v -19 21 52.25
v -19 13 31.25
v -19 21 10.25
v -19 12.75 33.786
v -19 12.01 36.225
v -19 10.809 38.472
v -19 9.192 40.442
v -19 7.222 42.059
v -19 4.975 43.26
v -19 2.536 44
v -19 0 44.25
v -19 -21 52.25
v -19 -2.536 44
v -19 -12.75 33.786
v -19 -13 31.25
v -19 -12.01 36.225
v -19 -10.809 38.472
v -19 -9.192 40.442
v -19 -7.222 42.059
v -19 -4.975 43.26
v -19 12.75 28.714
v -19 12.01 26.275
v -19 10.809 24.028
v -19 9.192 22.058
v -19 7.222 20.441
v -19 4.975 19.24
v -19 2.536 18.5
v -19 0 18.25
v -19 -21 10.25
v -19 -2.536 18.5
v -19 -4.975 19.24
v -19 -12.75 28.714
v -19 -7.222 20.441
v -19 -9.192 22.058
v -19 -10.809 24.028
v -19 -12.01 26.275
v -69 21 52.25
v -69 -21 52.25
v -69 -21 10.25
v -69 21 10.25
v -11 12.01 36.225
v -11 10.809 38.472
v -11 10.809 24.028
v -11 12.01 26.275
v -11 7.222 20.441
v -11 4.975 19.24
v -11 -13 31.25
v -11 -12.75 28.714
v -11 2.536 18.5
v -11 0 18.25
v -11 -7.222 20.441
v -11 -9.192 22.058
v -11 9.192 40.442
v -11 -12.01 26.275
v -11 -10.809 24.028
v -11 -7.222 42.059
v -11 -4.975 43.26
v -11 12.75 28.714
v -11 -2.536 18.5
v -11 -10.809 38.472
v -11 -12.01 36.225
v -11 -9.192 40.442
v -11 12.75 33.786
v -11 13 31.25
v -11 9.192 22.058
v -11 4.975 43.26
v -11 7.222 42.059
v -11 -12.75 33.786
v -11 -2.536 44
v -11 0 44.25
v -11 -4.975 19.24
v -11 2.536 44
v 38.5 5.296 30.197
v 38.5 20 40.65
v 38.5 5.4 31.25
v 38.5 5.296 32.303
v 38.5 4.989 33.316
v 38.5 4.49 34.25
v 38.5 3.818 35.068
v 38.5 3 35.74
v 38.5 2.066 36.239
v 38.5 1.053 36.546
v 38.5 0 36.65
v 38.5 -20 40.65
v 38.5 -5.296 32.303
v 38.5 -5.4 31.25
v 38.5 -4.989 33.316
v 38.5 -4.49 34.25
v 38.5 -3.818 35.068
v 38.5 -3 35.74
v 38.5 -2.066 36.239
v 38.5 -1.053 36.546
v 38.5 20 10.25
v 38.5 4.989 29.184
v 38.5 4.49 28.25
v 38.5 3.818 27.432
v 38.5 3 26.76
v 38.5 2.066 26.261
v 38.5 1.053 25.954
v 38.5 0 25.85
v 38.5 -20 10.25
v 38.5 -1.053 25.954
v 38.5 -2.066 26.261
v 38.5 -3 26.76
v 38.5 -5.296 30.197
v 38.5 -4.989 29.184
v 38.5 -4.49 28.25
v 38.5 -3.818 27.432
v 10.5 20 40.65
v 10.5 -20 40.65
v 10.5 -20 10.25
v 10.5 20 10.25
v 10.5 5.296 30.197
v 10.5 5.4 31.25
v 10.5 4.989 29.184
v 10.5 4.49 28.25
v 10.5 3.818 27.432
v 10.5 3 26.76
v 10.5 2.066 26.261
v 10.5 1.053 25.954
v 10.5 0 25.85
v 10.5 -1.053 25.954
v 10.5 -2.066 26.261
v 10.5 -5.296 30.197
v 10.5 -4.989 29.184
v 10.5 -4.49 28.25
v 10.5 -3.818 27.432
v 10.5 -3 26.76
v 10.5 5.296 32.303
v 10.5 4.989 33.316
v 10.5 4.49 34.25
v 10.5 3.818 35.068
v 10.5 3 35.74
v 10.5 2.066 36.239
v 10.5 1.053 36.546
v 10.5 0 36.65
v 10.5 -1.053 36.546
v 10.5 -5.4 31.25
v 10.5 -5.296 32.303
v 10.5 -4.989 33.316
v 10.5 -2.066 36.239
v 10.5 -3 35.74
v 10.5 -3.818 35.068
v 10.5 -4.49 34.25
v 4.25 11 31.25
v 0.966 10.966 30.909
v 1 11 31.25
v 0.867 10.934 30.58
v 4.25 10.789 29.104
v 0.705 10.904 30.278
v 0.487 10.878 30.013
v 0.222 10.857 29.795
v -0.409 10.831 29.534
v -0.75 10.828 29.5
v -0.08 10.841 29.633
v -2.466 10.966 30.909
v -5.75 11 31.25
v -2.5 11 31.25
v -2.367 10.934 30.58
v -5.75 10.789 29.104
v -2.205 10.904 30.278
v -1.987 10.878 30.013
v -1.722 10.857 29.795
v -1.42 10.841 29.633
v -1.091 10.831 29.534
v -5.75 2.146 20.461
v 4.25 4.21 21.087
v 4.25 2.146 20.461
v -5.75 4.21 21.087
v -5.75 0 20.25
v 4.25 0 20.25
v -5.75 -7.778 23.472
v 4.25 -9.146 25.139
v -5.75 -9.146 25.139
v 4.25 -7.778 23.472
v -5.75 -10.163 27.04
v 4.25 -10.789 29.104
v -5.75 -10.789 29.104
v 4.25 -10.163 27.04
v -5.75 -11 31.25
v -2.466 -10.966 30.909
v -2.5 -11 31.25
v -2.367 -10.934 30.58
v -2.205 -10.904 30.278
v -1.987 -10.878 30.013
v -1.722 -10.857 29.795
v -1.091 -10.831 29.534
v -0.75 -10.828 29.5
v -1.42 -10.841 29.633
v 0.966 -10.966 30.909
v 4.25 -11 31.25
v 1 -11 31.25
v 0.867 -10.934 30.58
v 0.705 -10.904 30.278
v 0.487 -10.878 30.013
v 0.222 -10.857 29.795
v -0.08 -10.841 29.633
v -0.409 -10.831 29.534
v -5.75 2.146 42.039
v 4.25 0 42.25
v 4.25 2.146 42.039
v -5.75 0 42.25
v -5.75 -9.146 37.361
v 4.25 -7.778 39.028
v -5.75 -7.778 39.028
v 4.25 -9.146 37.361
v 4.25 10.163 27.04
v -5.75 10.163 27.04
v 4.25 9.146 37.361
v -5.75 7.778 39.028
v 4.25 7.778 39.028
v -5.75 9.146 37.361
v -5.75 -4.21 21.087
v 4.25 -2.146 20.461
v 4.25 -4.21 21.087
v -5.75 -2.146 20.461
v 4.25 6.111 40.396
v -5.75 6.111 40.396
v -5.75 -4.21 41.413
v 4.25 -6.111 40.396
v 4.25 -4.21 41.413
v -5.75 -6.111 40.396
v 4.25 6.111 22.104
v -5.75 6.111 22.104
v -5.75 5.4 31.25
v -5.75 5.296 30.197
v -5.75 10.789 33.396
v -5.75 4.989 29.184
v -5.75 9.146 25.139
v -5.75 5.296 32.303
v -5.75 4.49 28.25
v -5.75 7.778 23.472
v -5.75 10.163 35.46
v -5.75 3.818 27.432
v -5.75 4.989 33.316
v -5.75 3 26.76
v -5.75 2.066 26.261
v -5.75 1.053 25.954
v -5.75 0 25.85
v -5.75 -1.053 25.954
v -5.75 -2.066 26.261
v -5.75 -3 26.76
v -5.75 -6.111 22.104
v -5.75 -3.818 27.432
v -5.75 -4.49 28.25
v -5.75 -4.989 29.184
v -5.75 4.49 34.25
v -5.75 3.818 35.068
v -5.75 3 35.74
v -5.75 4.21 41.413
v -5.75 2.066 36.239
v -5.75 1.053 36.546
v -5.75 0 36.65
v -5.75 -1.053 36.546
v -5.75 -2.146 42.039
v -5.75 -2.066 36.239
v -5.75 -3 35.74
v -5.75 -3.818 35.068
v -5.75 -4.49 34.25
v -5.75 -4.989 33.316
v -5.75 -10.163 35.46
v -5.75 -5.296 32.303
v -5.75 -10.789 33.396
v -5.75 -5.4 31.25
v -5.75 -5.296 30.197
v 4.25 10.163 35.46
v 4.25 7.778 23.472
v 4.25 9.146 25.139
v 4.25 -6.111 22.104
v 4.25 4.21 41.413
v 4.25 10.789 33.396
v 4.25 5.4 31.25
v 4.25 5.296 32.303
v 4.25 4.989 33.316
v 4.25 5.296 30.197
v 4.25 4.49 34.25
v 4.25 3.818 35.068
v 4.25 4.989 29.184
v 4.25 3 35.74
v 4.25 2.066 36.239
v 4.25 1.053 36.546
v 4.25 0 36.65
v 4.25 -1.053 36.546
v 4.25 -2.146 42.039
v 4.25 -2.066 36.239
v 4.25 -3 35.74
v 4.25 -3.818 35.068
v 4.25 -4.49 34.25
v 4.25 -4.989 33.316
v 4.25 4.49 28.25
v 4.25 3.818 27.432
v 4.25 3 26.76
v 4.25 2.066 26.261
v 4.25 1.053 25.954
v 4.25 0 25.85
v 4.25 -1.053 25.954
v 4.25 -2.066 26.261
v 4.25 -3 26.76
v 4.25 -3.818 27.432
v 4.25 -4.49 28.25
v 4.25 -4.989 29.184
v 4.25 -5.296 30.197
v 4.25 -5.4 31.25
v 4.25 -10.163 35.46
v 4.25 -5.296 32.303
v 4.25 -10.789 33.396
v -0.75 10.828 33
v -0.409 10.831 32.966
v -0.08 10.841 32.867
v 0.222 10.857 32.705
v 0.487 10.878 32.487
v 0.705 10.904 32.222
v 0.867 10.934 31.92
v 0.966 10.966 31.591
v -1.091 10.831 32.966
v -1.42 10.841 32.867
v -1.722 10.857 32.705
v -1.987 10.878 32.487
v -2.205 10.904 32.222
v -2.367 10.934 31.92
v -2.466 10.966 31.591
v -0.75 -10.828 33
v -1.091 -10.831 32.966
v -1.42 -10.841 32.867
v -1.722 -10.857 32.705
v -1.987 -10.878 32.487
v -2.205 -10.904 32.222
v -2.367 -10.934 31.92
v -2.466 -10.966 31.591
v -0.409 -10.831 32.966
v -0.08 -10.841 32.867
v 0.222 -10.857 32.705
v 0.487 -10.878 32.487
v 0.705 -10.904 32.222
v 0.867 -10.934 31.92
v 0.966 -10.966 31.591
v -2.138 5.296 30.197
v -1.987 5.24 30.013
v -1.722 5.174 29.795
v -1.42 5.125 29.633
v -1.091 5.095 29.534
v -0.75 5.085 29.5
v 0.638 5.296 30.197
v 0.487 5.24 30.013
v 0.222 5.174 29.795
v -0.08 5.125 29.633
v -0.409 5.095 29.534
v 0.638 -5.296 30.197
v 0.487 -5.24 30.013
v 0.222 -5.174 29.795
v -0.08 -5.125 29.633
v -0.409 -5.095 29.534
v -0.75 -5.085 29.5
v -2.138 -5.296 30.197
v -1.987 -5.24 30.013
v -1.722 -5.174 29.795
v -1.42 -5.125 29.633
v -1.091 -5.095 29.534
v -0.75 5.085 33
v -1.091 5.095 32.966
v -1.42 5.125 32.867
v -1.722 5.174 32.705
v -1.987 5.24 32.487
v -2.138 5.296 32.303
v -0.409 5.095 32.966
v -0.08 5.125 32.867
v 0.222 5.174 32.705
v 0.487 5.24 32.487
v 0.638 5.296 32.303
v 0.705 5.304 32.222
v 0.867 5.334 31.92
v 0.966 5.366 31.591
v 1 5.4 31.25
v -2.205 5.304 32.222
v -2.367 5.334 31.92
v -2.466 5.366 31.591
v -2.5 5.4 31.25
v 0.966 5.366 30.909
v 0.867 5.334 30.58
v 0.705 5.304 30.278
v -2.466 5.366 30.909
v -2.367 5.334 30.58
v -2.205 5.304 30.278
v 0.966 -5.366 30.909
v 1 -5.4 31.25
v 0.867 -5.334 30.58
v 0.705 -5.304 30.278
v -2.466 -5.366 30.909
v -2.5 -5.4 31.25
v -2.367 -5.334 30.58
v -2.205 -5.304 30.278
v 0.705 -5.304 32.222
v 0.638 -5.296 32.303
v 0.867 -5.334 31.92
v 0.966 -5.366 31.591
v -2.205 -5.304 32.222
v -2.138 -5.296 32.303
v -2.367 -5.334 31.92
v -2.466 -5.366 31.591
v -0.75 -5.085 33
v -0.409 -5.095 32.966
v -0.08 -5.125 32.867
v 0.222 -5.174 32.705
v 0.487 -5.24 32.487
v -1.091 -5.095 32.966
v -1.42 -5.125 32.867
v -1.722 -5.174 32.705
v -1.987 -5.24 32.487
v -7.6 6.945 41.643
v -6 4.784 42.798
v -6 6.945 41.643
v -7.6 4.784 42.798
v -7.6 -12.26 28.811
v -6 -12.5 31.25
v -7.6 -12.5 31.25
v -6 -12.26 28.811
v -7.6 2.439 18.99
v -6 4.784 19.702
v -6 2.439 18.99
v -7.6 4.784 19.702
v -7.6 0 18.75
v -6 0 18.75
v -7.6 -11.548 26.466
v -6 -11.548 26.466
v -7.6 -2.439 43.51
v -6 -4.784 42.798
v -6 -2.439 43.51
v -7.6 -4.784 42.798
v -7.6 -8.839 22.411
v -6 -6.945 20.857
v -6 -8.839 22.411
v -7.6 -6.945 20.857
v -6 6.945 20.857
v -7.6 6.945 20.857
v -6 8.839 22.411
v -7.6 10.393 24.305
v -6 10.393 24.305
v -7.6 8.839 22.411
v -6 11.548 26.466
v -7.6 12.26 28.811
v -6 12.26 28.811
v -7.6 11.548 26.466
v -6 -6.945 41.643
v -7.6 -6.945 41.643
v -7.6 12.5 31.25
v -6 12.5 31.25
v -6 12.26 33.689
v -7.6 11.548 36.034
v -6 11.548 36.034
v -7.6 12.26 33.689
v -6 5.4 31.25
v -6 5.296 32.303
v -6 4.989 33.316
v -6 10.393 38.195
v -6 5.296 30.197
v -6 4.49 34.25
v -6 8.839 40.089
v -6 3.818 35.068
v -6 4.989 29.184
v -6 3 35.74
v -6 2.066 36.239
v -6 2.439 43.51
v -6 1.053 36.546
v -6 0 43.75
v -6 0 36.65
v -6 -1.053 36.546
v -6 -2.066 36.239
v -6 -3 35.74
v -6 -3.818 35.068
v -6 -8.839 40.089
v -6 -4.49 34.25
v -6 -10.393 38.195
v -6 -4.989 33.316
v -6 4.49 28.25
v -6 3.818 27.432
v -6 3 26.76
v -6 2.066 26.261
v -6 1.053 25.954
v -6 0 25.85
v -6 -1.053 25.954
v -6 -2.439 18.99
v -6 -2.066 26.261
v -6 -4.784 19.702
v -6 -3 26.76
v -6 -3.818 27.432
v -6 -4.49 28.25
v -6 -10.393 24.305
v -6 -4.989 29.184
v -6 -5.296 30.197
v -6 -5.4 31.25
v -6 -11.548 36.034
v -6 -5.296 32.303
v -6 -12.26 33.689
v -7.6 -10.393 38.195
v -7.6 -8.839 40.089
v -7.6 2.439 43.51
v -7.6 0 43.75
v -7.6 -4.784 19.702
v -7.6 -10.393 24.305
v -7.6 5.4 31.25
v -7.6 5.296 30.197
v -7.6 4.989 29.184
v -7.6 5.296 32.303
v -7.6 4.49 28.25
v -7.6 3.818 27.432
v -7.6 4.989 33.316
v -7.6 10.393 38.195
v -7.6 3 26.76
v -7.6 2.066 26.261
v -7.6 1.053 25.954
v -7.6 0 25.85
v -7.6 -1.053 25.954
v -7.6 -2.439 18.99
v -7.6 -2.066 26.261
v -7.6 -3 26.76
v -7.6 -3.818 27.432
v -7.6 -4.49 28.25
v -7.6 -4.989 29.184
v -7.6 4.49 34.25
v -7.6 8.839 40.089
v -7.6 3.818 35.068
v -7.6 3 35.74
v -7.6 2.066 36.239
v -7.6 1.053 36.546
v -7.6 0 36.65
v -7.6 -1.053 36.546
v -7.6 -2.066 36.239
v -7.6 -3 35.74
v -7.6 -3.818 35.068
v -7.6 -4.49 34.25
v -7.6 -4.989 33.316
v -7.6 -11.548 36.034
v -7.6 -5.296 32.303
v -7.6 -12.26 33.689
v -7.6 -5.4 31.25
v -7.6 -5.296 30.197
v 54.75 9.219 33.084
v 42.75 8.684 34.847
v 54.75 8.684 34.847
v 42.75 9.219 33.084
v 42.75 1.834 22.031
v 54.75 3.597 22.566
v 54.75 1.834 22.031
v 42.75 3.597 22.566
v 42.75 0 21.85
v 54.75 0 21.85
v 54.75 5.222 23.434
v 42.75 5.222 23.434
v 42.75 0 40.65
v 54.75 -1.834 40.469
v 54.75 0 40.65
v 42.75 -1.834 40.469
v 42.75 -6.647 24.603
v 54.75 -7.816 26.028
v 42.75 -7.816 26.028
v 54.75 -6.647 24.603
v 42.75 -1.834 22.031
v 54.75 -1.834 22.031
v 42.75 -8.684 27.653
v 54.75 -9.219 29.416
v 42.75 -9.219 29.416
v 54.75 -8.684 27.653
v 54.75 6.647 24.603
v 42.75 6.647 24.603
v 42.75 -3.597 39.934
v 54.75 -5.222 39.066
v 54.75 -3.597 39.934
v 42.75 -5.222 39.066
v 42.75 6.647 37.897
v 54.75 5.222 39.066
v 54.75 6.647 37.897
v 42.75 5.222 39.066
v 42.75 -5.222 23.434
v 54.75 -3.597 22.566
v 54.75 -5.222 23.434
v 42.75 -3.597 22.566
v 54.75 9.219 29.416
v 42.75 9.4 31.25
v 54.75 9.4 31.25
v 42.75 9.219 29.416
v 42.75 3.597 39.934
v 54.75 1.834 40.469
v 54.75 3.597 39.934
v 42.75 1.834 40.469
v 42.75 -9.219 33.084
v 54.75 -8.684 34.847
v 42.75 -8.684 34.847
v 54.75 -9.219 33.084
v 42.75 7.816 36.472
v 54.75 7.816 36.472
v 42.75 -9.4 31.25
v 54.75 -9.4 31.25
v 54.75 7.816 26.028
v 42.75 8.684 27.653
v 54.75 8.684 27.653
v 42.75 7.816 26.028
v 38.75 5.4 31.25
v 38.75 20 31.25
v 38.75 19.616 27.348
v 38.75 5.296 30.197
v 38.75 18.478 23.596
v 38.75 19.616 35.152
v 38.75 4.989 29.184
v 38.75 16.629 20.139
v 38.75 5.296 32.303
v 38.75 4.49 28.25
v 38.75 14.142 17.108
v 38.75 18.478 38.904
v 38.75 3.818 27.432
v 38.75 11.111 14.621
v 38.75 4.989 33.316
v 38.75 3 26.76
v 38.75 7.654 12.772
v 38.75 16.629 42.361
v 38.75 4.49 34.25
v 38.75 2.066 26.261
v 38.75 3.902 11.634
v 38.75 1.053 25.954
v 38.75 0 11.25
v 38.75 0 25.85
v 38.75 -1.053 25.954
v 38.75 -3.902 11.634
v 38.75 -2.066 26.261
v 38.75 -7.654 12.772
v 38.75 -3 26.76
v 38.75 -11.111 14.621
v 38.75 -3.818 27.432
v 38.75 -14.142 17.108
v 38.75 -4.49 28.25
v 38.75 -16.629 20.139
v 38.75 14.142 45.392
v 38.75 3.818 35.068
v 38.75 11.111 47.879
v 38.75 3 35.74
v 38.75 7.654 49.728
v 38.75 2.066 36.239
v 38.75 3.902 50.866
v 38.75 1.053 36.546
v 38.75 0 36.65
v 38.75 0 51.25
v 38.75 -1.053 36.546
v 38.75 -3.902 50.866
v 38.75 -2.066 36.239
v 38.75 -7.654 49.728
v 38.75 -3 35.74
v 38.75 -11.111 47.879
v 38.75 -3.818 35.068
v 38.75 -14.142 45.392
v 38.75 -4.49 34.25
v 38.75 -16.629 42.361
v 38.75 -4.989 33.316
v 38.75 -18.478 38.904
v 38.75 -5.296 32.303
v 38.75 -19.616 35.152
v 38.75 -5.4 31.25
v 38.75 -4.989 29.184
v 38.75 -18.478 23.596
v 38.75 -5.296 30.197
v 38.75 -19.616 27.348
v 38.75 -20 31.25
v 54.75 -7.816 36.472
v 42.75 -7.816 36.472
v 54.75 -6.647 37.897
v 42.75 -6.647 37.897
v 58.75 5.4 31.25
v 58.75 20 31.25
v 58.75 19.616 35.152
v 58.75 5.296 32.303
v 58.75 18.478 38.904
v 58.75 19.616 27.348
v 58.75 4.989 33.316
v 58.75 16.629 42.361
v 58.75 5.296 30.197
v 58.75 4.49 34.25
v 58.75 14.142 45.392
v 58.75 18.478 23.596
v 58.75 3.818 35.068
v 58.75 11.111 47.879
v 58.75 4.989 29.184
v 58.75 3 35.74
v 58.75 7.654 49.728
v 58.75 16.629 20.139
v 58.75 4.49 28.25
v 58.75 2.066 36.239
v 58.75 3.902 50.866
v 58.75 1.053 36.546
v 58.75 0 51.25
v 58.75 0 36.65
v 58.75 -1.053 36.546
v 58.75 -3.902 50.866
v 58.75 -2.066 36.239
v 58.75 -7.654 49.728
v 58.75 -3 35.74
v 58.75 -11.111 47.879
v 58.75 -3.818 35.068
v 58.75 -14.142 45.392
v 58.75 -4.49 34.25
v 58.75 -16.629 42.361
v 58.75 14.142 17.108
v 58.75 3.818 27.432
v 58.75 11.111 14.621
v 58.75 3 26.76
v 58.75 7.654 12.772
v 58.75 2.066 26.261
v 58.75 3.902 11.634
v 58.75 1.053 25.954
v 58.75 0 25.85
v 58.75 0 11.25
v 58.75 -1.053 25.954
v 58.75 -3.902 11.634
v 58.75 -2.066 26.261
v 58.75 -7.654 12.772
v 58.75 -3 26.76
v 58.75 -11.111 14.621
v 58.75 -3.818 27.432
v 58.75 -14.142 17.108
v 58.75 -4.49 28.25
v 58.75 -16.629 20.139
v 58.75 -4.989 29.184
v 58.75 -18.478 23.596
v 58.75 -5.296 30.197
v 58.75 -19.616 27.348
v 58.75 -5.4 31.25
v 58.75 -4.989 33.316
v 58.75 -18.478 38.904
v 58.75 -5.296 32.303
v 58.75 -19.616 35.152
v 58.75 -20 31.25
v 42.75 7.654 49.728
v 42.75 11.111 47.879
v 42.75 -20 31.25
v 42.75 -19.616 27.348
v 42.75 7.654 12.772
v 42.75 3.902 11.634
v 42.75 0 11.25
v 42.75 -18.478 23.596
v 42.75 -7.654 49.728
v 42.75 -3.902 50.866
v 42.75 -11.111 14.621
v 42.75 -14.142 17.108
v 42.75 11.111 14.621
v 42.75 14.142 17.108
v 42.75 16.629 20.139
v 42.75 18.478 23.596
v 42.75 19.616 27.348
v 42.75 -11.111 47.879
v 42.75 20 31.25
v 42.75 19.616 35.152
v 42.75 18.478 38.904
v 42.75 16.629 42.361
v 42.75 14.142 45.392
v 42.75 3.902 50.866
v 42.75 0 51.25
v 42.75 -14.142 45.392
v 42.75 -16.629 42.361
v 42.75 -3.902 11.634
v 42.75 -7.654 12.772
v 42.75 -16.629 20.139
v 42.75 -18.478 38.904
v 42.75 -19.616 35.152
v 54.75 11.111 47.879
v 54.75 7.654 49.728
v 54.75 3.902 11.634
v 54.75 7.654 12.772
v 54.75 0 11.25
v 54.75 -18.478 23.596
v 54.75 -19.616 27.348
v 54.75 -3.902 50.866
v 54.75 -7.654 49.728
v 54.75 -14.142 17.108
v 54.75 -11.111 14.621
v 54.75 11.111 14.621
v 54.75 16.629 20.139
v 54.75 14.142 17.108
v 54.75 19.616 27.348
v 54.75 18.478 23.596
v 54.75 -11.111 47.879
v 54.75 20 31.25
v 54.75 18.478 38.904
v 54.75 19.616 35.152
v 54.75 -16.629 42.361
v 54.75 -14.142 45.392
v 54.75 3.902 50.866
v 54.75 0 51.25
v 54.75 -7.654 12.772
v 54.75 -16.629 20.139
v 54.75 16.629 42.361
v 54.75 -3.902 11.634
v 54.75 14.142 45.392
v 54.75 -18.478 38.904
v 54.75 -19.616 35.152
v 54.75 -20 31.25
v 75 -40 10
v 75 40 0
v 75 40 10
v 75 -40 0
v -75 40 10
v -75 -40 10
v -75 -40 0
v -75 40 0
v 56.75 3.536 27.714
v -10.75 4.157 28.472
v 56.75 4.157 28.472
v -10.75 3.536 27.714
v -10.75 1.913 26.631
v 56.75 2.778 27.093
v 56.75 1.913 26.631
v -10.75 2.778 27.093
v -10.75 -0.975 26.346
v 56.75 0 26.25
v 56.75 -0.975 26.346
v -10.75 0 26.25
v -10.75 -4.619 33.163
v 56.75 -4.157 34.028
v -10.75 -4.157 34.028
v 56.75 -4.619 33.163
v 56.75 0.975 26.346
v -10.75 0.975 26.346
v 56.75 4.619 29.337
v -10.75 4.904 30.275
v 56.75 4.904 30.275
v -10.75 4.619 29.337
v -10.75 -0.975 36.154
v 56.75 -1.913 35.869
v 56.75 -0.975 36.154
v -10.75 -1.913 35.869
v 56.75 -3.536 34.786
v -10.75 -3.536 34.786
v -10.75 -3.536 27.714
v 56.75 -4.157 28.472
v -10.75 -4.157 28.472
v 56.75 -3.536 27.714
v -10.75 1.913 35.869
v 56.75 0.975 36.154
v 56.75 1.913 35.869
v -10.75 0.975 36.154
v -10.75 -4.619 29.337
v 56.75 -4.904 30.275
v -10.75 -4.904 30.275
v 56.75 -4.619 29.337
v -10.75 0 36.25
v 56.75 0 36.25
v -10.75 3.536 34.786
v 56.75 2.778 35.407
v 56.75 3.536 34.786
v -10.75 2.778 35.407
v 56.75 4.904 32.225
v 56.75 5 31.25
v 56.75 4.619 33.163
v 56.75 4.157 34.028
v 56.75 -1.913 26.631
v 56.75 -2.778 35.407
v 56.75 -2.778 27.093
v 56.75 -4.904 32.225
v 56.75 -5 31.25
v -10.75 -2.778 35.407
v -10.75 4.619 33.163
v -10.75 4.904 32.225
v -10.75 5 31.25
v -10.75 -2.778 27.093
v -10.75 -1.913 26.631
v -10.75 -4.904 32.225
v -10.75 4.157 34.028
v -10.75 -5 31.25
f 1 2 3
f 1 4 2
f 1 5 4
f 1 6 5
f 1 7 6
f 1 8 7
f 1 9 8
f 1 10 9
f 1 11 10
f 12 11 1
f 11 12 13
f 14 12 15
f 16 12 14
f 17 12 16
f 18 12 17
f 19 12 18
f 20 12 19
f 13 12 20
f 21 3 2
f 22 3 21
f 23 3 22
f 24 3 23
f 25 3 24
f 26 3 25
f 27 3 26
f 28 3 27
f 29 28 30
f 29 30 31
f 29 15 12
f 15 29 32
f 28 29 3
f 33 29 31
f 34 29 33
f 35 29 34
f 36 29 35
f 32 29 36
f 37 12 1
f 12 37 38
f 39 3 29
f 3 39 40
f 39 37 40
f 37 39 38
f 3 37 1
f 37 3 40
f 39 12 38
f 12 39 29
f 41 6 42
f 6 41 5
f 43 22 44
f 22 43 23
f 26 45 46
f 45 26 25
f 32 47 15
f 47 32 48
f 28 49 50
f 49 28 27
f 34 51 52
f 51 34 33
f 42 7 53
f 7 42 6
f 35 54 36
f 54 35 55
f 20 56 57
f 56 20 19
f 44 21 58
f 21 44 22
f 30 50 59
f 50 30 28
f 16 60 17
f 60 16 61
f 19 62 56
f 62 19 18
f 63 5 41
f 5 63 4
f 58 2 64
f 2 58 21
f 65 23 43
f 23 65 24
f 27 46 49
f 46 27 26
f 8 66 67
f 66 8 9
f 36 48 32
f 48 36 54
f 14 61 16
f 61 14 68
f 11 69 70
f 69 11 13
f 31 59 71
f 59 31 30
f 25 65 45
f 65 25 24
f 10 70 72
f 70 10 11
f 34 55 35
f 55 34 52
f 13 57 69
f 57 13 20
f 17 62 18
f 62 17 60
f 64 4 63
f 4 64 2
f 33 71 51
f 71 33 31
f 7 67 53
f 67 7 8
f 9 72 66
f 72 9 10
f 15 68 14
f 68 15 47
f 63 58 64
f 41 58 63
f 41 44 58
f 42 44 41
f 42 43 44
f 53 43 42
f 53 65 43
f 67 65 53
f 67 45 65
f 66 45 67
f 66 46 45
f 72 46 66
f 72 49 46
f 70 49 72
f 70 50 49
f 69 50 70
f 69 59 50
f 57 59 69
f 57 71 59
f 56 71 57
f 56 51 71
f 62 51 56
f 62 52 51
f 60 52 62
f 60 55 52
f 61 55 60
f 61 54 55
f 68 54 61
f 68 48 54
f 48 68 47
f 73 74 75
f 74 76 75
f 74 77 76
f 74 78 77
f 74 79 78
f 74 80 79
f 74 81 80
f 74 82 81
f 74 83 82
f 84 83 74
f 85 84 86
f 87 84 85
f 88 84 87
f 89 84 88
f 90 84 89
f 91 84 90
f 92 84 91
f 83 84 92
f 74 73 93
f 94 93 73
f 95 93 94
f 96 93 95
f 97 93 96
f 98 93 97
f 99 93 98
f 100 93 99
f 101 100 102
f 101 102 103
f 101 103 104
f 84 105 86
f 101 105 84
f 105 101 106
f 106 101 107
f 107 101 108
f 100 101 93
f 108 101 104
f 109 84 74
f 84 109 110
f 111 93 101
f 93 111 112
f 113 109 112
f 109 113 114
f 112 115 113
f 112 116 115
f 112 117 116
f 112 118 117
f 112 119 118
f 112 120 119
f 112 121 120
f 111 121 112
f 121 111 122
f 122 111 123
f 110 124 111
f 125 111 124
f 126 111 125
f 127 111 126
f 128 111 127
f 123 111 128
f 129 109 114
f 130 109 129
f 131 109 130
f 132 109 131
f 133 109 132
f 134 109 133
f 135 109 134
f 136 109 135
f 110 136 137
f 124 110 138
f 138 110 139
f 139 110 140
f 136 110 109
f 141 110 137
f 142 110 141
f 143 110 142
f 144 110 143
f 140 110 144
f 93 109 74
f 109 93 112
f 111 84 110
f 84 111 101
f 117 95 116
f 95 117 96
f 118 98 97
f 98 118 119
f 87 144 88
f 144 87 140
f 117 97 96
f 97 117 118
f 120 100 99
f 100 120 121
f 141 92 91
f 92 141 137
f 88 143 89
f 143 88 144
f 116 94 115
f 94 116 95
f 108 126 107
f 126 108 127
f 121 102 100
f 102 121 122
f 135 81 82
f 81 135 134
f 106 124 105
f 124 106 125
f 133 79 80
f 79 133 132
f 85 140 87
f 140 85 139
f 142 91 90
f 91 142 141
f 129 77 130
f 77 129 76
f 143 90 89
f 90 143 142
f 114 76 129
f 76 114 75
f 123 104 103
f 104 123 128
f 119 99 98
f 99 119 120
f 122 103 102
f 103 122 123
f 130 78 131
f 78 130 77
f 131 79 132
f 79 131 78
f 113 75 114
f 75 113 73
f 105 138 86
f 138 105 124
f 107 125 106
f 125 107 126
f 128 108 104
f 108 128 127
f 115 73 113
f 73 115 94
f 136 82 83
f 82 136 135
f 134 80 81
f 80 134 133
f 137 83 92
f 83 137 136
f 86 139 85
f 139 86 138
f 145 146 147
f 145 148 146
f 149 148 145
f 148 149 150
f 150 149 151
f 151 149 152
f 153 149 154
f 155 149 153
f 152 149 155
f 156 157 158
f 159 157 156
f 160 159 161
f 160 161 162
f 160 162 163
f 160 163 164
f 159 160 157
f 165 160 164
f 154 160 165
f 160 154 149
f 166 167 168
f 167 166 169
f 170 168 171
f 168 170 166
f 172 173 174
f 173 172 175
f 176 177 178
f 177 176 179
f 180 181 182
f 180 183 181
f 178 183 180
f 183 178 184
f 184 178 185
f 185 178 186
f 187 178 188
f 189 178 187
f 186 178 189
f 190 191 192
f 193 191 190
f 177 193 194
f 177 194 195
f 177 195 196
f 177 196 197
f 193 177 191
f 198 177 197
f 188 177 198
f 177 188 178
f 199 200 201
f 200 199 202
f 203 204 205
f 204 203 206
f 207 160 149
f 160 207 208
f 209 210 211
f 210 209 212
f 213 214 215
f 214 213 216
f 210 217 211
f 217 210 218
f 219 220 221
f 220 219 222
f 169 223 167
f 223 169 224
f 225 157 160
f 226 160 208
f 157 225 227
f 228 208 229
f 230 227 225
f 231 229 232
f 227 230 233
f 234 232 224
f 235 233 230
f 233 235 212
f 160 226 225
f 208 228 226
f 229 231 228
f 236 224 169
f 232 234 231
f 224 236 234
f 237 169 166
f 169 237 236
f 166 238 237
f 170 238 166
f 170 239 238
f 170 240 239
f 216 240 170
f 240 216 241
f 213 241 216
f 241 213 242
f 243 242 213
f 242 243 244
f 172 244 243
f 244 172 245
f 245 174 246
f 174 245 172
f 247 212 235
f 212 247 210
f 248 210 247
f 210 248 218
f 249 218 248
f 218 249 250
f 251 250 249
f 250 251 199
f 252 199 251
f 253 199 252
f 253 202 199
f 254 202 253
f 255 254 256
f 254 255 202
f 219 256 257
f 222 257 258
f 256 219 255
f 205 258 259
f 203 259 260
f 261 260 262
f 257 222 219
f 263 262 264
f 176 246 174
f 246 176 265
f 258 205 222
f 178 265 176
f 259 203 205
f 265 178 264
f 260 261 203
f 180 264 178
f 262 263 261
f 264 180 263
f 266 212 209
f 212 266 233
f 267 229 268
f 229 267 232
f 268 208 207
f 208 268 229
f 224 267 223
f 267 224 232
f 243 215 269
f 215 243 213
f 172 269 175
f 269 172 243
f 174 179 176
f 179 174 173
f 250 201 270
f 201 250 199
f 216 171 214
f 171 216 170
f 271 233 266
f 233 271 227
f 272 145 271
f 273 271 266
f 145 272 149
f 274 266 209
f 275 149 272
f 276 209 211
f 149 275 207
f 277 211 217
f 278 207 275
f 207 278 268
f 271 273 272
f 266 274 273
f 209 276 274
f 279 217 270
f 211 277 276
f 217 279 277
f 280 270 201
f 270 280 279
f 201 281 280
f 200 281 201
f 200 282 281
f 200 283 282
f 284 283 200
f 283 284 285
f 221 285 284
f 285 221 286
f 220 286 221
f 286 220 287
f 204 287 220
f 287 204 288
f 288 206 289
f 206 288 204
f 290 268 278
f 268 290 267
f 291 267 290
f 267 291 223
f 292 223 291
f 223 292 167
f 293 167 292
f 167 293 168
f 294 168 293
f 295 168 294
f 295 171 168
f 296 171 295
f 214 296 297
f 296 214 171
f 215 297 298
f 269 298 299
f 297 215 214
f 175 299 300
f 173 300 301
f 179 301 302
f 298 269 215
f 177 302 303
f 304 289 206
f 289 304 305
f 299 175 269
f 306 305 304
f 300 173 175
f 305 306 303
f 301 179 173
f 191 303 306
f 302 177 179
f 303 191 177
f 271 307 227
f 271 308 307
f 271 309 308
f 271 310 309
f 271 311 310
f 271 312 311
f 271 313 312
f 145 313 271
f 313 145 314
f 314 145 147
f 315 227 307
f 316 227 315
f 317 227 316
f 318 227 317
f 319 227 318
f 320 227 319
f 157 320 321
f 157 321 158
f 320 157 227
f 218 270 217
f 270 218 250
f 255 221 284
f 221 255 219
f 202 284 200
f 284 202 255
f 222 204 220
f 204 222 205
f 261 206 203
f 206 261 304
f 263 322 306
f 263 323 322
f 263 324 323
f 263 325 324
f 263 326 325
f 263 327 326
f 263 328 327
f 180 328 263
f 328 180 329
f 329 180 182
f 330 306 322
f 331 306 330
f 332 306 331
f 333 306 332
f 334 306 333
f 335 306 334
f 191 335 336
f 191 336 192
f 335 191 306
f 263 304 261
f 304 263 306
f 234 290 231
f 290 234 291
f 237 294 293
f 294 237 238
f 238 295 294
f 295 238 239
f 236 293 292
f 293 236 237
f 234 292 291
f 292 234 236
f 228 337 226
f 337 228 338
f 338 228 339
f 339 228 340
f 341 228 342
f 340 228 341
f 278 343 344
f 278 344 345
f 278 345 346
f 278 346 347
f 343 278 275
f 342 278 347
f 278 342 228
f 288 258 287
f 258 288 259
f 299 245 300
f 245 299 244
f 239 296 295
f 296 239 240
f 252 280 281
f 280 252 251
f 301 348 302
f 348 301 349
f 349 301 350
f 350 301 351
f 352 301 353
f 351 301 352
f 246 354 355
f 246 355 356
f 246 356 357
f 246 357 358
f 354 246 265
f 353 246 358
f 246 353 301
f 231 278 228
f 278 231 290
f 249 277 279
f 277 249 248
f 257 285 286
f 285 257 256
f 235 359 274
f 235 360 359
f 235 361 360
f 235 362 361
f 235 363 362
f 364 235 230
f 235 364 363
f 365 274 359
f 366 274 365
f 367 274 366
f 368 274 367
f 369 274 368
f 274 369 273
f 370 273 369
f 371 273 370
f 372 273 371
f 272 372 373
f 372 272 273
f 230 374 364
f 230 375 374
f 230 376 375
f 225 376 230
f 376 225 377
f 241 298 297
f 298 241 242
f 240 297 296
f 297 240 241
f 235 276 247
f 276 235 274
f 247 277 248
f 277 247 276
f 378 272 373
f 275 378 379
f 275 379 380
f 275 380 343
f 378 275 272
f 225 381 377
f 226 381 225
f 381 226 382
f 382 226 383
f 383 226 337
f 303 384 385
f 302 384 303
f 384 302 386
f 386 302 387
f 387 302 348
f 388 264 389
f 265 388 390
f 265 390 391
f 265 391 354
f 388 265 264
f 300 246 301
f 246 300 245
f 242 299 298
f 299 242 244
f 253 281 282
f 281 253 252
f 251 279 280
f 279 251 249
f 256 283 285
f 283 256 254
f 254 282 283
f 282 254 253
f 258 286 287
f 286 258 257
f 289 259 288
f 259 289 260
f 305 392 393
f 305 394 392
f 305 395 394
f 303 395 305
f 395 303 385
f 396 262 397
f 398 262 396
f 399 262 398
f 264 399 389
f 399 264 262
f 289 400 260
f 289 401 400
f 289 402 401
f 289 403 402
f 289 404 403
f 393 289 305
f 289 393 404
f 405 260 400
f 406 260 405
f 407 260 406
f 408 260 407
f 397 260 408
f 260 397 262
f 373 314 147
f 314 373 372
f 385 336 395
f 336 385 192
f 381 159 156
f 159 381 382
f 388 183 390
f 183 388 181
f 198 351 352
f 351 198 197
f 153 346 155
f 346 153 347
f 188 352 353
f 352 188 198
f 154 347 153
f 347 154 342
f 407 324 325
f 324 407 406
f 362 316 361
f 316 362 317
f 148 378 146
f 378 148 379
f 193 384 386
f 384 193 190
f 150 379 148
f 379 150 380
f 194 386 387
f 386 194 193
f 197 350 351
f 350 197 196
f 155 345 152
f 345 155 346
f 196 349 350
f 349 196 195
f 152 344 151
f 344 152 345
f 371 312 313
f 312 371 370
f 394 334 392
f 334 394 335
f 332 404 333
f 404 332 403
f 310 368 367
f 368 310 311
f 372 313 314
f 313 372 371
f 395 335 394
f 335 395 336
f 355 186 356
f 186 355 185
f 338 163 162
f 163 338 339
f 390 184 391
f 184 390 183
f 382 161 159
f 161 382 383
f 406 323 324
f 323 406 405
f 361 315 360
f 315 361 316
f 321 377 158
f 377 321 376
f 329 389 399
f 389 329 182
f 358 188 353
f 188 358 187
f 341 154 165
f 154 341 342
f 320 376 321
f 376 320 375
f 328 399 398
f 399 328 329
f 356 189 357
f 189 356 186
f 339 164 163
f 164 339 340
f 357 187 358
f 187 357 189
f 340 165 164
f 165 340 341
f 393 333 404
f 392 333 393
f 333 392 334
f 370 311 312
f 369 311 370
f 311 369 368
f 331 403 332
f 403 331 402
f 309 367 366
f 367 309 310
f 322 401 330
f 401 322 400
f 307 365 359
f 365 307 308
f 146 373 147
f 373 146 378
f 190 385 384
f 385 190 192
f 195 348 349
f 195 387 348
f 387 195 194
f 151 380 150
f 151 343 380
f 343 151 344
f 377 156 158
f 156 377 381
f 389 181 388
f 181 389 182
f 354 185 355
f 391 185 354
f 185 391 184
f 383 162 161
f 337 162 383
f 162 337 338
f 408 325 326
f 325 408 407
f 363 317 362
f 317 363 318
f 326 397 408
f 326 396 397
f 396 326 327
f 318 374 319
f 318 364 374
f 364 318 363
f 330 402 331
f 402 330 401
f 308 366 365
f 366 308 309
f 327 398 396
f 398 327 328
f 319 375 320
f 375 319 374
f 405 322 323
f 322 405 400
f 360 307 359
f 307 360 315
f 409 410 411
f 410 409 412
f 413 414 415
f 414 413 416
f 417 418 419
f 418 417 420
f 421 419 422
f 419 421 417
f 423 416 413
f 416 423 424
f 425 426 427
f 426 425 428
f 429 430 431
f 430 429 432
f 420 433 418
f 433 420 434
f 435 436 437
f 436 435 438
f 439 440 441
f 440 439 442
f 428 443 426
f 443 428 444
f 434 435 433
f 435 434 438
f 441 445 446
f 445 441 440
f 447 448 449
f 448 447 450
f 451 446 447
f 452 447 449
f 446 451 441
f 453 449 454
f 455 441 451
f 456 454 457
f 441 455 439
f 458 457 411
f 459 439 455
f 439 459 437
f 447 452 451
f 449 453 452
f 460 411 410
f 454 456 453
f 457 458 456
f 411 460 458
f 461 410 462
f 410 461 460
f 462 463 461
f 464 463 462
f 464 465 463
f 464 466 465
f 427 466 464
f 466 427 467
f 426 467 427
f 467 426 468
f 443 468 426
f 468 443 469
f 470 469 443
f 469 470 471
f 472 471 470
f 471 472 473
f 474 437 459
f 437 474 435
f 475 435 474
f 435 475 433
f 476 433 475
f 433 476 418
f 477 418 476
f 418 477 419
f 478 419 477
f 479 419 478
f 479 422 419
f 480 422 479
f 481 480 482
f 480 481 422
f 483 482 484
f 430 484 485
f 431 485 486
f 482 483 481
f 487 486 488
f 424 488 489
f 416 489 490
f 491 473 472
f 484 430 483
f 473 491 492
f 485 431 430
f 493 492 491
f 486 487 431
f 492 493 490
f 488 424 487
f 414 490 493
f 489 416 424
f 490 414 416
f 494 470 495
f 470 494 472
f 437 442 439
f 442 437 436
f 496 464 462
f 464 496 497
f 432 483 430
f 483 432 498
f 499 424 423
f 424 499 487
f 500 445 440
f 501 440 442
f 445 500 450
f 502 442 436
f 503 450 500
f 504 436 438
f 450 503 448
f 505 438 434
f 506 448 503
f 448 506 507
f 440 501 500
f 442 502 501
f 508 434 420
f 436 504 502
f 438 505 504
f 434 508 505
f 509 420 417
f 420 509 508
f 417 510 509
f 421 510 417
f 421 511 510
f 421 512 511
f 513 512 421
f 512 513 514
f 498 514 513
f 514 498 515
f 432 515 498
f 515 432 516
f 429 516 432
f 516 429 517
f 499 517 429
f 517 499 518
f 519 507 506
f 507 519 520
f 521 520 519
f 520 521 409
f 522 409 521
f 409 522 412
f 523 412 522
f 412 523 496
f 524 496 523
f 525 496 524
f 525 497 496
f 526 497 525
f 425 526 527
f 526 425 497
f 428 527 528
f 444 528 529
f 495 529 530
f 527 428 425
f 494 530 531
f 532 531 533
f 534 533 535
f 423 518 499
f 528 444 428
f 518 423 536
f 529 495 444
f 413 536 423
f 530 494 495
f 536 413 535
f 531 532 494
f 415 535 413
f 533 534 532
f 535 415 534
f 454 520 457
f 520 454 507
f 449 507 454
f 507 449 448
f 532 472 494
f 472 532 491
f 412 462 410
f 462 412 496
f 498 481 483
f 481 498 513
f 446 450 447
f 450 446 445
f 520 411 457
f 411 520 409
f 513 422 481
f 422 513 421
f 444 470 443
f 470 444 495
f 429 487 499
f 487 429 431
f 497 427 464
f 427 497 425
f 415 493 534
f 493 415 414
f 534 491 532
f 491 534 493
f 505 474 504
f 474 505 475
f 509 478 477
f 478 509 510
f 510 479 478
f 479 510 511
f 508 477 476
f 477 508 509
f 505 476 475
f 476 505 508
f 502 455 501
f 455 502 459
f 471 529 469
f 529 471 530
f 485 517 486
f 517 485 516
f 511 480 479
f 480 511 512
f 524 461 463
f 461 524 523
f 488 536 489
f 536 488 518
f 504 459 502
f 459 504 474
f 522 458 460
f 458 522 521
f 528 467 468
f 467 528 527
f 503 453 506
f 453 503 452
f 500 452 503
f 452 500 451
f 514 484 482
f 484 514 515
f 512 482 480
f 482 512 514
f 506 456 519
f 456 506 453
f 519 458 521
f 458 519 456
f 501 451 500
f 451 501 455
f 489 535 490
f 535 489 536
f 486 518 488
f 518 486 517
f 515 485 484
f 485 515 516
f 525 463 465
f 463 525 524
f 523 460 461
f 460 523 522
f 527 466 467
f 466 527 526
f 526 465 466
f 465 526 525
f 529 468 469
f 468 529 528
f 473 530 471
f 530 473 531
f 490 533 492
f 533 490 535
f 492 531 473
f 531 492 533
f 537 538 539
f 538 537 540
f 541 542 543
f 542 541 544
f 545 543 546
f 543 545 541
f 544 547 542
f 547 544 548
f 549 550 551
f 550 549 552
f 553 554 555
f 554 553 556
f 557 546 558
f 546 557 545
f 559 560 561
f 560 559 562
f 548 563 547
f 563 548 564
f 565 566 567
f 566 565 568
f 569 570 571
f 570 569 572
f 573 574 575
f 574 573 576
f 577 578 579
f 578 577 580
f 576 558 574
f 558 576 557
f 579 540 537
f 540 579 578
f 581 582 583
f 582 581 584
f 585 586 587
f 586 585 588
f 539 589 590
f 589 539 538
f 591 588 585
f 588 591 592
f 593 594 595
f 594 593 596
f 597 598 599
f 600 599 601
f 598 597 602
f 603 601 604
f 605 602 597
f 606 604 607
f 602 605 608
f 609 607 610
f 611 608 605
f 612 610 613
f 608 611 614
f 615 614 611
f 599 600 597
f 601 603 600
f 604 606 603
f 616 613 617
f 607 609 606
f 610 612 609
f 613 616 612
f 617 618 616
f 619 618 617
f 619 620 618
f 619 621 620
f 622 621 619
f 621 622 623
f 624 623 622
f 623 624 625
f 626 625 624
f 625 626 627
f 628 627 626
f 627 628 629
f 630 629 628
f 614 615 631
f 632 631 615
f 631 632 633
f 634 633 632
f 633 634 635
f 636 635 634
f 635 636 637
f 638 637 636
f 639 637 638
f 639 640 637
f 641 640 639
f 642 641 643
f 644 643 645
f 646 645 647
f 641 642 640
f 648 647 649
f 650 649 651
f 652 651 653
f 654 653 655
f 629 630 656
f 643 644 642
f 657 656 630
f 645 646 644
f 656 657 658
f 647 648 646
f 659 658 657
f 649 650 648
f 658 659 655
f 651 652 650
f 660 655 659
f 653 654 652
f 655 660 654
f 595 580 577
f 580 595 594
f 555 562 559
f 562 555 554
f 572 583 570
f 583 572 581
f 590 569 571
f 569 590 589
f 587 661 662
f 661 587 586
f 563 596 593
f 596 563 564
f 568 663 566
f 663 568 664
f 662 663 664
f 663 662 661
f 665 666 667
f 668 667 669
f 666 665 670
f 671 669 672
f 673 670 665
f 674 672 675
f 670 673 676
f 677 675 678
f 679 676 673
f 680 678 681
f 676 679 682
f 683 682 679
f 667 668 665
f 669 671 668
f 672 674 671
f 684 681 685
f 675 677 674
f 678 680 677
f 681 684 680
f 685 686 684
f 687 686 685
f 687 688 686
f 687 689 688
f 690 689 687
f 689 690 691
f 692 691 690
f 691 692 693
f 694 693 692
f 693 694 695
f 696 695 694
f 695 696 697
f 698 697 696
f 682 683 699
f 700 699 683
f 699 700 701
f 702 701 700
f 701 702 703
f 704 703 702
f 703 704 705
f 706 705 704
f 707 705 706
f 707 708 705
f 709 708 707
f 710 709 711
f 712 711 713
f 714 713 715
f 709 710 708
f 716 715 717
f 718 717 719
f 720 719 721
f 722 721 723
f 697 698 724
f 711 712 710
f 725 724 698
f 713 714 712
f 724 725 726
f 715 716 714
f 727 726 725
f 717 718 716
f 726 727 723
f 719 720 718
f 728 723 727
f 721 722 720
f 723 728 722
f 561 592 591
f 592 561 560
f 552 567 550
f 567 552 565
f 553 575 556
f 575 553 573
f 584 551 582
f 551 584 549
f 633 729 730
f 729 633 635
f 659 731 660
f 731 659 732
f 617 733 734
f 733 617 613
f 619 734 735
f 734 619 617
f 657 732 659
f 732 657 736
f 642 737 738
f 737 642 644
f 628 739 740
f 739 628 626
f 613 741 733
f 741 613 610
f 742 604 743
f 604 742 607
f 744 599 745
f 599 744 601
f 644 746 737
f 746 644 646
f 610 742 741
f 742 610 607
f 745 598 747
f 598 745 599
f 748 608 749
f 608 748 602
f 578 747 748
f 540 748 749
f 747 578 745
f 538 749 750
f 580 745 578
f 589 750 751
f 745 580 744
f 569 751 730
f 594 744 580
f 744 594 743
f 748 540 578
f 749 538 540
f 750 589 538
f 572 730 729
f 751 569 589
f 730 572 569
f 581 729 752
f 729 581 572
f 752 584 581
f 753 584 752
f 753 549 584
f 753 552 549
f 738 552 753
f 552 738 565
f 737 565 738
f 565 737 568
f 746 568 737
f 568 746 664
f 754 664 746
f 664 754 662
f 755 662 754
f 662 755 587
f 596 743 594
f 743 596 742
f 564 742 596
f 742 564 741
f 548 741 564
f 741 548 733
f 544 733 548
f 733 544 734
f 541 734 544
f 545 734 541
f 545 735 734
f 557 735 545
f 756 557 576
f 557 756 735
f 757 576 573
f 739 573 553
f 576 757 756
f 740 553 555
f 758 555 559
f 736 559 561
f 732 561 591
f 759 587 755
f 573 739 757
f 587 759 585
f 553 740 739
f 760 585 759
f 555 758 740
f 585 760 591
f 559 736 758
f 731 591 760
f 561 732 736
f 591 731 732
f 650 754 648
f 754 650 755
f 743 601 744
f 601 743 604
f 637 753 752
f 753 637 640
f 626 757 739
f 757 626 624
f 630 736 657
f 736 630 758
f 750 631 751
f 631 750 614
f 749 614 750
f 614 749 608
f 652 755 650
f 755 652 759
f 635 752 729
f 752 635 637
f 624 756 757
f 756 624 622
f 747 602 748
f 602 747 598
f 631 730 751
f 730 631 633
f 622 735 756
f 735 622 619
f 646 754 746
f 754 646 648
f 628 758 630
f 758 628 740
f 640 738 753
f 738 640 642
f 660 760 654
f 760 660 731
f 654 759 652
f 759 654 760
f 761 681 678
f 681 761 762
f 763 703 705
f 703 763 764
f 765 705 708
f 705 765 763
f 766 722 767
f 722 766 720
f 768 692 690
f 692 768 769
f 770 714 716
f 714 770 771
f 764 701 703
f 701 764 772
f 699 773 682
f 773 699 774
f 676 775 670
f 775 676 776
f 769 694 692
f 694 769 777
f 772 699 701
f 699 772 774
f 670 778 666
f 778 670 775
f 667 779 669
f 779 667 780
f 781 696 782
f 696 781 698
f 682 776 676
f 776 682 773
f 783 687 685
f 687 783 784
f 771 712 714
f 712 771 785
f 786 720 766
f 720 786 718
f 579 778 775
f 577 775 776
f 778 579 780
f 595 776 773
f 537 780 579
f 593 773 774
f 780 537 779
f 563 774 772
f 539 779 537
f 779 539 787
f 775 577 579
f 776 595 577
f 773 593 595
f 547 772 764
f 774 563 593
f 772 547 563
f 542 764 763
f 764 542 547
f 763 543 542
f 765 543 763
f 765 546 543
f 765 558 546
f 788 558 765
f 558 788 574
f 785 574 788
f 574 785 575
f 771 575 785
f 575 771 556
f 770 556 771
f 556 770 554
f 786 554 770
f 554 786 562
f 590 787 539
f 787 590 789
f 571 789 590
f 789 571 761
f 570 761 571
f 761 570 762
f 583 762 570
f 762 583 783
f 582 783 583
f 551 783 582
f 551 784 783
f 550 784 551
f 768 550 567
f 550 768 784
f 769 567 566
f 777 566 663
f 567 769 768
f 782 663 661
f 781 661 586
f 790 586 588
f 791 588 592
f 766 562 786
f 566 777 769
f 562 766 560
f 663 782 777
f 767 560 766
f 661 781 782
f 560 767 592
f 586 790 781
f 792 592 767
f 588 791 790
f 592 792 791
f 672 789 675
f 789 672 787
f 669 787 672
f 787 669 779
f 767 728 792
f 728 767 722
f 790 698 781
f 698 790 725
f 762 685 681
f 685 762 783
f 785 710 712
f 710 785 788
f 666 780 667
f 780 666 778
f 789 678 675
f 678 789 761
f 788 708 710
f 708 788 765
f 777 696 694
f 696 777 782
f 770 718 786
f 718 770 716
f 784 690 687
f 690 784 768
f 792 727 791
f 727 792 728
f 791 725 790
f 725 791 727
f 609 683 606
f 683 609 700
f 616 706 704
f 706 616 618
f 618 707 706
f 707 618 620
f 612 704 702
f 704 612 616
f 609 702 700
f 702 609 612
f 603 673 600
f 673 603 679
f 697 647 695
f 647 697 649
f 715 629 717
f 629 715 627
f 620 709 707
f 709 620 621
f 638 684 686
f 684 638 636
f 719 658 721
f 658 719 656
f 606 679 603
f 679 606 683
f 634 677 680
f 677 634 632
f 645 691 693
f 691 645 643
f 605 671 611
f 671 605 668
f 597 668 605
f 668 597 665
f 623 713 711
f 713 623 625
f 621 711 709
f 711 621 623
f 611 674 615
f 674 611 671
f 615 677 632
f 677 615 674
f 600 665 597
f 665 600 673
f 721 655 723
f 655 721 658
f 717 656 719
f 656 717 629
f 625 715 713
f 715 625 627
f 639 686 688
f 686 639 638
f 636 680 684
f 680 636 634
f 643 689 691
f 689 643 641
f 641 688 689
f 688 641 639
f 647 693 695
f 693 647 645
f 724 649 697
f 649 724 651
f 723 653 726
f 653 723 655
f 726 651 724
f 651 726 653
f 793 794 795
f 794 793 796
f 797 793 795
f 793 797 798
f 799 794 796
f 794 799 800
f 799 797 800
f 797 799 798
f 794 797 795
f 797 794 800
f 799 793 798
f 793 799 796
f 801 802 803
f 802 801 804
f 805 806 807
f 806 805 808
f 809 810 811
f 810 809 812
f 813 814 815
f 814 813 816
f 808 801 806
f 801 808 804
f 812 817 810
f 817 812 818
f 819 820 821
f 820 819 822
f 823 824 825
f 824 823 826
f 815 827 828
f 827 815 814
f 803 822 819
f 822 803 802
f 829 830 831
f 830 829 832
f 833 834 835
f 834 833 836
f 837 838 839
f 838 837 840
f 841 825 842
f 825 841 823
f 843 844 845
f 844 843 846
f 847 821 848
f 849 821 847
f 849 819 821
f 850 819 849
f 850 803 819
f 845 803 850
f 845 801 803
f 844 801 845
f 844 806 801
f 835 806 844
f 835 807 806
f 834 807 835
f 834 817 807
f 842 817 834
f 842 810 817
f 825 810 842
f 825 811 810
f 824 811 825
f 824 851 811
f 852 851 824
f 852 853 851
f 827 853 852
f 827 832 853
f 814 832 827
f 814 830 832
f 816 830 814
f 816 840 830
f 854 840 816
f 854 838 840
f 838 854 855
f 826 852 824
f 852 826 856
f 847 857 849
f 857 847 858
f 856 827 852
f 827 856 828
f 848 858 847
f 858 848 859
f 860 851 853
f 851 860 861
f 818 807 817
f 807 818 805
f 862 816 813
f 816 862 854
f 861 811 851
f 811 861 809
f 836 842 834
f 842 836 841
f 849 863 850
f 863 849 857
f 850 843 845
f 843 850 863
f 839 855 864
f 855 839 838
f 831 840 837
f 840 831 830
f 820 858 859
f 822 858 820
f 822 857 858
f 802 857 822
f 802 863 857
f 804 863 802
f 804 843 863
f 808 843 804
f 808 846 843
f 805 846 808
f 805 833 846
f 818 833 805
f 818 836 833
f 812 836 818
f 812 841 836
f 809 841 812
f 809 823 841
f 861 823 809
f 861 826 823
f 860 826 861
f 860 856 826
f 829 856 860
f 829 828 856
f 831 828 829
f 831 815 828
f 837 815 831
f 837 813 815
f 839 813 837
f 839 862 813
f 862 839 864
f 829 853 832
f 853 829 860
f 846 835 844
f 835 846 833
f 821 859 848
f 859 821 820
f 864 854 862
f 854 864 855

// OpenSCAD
$fn = 32;

// ------------------------------------------------------------------------
// Motor drive station: motor 50 x 42 mm, shaft d10, pulley d40
// Every part is its own module, assembly() places every instance.
// ------------------------------------------------------------------------

// --- part 1 ---
module station_bed() {
  difference() {
    translate([-75, -40, 0]) cube([150, 80, 10]);
  }
}

// --- part 2 ---
module drive_motor() {
  union() {
    translate([-25, -21, 0]) cube([50, 42, 42]);
    translate([29, 0, 21]) rotate([0, 90, 0]) cylinder(h = 8, d = 26, center = true);
  }
}

// --- part 3 ---
module pillow_block() {
  difference() {
    translate([-14, -20, 0]) cube([28, 40, 30.4]);
    translate([0, 0, 21]) rotate([0, 90, 0]) cylinder(h = 30, d = 10.8, center = true);
  }
}

// --- part 4 ---
module drive_shaft() {
  translate([0, 0, -33.75]) cylinder(h = 67.5, d = 10);
}

// --- part 5 ---
module shaft_collar() {
  difference() {
    cylinder(h = 10, d = 22);
    translate([0, 0, -1]) cylinder(h = 12, d = 10.8);
    translate([0, 0, 5]) rotate([90, 0, 0]) cylinder(h = 24, d = 3.5, center = true);
  }
}

// --- part 6 ---
module collar_washer() {
  difference() {
      translate([0, 0, 0]) cylinder(h = 1.6, d = 25);
      translate([0, 0, -1]) cylinder(h = 3.6, d = 10.8);
    }
}

// --- part 7 ---
module drive_pulley() {
  difference() {
    union() {
      cylinder(h = 20, d = 18.8);
      cylinder(h = 4, d = 40);
      translate([0, 0, 16]) cylinder(h = 4, d = 40);
    }
    translate([0, 0, -1]) cylinder(h = 22, d = 10.8);
  }
}

// --- assembly ---
module assembly() {
  color([0.80, 0.24, 0.20]) translate([0, 0, 0]) rotate([0, 0, 0]) station_bed();
  color([0.20, 0.45, 0.75]) translate([-44, 0, 10.25]) rotate([0, 0, 0]) drive_motor();
  color([0.25, 0.62, 0.32]) translate([24.5, 0, 10.25]) rotate([0, 0, 0]) pillow_block();
  color([0.92, 0.70, 0.18]) translate([23, 0, 31.25]) rotate([0, 90, 0]) drive_shaft();
  color([0.58, 0.35, 0.70]) translate([-5.75, 0, 31.25]) rotate([0, 90, 0]) shaft_collar();
  color([0.16, 0.66, 0.66]) translate([-7.6, 0, 31.25]) rotate([0, 90, 0]) collar_washer();
  color([0.85, 0.48, 0.18]) translate([38.75, 0, 31.25]) rotate([0, 90, 0]) drive_pulley();
}

assembly();
